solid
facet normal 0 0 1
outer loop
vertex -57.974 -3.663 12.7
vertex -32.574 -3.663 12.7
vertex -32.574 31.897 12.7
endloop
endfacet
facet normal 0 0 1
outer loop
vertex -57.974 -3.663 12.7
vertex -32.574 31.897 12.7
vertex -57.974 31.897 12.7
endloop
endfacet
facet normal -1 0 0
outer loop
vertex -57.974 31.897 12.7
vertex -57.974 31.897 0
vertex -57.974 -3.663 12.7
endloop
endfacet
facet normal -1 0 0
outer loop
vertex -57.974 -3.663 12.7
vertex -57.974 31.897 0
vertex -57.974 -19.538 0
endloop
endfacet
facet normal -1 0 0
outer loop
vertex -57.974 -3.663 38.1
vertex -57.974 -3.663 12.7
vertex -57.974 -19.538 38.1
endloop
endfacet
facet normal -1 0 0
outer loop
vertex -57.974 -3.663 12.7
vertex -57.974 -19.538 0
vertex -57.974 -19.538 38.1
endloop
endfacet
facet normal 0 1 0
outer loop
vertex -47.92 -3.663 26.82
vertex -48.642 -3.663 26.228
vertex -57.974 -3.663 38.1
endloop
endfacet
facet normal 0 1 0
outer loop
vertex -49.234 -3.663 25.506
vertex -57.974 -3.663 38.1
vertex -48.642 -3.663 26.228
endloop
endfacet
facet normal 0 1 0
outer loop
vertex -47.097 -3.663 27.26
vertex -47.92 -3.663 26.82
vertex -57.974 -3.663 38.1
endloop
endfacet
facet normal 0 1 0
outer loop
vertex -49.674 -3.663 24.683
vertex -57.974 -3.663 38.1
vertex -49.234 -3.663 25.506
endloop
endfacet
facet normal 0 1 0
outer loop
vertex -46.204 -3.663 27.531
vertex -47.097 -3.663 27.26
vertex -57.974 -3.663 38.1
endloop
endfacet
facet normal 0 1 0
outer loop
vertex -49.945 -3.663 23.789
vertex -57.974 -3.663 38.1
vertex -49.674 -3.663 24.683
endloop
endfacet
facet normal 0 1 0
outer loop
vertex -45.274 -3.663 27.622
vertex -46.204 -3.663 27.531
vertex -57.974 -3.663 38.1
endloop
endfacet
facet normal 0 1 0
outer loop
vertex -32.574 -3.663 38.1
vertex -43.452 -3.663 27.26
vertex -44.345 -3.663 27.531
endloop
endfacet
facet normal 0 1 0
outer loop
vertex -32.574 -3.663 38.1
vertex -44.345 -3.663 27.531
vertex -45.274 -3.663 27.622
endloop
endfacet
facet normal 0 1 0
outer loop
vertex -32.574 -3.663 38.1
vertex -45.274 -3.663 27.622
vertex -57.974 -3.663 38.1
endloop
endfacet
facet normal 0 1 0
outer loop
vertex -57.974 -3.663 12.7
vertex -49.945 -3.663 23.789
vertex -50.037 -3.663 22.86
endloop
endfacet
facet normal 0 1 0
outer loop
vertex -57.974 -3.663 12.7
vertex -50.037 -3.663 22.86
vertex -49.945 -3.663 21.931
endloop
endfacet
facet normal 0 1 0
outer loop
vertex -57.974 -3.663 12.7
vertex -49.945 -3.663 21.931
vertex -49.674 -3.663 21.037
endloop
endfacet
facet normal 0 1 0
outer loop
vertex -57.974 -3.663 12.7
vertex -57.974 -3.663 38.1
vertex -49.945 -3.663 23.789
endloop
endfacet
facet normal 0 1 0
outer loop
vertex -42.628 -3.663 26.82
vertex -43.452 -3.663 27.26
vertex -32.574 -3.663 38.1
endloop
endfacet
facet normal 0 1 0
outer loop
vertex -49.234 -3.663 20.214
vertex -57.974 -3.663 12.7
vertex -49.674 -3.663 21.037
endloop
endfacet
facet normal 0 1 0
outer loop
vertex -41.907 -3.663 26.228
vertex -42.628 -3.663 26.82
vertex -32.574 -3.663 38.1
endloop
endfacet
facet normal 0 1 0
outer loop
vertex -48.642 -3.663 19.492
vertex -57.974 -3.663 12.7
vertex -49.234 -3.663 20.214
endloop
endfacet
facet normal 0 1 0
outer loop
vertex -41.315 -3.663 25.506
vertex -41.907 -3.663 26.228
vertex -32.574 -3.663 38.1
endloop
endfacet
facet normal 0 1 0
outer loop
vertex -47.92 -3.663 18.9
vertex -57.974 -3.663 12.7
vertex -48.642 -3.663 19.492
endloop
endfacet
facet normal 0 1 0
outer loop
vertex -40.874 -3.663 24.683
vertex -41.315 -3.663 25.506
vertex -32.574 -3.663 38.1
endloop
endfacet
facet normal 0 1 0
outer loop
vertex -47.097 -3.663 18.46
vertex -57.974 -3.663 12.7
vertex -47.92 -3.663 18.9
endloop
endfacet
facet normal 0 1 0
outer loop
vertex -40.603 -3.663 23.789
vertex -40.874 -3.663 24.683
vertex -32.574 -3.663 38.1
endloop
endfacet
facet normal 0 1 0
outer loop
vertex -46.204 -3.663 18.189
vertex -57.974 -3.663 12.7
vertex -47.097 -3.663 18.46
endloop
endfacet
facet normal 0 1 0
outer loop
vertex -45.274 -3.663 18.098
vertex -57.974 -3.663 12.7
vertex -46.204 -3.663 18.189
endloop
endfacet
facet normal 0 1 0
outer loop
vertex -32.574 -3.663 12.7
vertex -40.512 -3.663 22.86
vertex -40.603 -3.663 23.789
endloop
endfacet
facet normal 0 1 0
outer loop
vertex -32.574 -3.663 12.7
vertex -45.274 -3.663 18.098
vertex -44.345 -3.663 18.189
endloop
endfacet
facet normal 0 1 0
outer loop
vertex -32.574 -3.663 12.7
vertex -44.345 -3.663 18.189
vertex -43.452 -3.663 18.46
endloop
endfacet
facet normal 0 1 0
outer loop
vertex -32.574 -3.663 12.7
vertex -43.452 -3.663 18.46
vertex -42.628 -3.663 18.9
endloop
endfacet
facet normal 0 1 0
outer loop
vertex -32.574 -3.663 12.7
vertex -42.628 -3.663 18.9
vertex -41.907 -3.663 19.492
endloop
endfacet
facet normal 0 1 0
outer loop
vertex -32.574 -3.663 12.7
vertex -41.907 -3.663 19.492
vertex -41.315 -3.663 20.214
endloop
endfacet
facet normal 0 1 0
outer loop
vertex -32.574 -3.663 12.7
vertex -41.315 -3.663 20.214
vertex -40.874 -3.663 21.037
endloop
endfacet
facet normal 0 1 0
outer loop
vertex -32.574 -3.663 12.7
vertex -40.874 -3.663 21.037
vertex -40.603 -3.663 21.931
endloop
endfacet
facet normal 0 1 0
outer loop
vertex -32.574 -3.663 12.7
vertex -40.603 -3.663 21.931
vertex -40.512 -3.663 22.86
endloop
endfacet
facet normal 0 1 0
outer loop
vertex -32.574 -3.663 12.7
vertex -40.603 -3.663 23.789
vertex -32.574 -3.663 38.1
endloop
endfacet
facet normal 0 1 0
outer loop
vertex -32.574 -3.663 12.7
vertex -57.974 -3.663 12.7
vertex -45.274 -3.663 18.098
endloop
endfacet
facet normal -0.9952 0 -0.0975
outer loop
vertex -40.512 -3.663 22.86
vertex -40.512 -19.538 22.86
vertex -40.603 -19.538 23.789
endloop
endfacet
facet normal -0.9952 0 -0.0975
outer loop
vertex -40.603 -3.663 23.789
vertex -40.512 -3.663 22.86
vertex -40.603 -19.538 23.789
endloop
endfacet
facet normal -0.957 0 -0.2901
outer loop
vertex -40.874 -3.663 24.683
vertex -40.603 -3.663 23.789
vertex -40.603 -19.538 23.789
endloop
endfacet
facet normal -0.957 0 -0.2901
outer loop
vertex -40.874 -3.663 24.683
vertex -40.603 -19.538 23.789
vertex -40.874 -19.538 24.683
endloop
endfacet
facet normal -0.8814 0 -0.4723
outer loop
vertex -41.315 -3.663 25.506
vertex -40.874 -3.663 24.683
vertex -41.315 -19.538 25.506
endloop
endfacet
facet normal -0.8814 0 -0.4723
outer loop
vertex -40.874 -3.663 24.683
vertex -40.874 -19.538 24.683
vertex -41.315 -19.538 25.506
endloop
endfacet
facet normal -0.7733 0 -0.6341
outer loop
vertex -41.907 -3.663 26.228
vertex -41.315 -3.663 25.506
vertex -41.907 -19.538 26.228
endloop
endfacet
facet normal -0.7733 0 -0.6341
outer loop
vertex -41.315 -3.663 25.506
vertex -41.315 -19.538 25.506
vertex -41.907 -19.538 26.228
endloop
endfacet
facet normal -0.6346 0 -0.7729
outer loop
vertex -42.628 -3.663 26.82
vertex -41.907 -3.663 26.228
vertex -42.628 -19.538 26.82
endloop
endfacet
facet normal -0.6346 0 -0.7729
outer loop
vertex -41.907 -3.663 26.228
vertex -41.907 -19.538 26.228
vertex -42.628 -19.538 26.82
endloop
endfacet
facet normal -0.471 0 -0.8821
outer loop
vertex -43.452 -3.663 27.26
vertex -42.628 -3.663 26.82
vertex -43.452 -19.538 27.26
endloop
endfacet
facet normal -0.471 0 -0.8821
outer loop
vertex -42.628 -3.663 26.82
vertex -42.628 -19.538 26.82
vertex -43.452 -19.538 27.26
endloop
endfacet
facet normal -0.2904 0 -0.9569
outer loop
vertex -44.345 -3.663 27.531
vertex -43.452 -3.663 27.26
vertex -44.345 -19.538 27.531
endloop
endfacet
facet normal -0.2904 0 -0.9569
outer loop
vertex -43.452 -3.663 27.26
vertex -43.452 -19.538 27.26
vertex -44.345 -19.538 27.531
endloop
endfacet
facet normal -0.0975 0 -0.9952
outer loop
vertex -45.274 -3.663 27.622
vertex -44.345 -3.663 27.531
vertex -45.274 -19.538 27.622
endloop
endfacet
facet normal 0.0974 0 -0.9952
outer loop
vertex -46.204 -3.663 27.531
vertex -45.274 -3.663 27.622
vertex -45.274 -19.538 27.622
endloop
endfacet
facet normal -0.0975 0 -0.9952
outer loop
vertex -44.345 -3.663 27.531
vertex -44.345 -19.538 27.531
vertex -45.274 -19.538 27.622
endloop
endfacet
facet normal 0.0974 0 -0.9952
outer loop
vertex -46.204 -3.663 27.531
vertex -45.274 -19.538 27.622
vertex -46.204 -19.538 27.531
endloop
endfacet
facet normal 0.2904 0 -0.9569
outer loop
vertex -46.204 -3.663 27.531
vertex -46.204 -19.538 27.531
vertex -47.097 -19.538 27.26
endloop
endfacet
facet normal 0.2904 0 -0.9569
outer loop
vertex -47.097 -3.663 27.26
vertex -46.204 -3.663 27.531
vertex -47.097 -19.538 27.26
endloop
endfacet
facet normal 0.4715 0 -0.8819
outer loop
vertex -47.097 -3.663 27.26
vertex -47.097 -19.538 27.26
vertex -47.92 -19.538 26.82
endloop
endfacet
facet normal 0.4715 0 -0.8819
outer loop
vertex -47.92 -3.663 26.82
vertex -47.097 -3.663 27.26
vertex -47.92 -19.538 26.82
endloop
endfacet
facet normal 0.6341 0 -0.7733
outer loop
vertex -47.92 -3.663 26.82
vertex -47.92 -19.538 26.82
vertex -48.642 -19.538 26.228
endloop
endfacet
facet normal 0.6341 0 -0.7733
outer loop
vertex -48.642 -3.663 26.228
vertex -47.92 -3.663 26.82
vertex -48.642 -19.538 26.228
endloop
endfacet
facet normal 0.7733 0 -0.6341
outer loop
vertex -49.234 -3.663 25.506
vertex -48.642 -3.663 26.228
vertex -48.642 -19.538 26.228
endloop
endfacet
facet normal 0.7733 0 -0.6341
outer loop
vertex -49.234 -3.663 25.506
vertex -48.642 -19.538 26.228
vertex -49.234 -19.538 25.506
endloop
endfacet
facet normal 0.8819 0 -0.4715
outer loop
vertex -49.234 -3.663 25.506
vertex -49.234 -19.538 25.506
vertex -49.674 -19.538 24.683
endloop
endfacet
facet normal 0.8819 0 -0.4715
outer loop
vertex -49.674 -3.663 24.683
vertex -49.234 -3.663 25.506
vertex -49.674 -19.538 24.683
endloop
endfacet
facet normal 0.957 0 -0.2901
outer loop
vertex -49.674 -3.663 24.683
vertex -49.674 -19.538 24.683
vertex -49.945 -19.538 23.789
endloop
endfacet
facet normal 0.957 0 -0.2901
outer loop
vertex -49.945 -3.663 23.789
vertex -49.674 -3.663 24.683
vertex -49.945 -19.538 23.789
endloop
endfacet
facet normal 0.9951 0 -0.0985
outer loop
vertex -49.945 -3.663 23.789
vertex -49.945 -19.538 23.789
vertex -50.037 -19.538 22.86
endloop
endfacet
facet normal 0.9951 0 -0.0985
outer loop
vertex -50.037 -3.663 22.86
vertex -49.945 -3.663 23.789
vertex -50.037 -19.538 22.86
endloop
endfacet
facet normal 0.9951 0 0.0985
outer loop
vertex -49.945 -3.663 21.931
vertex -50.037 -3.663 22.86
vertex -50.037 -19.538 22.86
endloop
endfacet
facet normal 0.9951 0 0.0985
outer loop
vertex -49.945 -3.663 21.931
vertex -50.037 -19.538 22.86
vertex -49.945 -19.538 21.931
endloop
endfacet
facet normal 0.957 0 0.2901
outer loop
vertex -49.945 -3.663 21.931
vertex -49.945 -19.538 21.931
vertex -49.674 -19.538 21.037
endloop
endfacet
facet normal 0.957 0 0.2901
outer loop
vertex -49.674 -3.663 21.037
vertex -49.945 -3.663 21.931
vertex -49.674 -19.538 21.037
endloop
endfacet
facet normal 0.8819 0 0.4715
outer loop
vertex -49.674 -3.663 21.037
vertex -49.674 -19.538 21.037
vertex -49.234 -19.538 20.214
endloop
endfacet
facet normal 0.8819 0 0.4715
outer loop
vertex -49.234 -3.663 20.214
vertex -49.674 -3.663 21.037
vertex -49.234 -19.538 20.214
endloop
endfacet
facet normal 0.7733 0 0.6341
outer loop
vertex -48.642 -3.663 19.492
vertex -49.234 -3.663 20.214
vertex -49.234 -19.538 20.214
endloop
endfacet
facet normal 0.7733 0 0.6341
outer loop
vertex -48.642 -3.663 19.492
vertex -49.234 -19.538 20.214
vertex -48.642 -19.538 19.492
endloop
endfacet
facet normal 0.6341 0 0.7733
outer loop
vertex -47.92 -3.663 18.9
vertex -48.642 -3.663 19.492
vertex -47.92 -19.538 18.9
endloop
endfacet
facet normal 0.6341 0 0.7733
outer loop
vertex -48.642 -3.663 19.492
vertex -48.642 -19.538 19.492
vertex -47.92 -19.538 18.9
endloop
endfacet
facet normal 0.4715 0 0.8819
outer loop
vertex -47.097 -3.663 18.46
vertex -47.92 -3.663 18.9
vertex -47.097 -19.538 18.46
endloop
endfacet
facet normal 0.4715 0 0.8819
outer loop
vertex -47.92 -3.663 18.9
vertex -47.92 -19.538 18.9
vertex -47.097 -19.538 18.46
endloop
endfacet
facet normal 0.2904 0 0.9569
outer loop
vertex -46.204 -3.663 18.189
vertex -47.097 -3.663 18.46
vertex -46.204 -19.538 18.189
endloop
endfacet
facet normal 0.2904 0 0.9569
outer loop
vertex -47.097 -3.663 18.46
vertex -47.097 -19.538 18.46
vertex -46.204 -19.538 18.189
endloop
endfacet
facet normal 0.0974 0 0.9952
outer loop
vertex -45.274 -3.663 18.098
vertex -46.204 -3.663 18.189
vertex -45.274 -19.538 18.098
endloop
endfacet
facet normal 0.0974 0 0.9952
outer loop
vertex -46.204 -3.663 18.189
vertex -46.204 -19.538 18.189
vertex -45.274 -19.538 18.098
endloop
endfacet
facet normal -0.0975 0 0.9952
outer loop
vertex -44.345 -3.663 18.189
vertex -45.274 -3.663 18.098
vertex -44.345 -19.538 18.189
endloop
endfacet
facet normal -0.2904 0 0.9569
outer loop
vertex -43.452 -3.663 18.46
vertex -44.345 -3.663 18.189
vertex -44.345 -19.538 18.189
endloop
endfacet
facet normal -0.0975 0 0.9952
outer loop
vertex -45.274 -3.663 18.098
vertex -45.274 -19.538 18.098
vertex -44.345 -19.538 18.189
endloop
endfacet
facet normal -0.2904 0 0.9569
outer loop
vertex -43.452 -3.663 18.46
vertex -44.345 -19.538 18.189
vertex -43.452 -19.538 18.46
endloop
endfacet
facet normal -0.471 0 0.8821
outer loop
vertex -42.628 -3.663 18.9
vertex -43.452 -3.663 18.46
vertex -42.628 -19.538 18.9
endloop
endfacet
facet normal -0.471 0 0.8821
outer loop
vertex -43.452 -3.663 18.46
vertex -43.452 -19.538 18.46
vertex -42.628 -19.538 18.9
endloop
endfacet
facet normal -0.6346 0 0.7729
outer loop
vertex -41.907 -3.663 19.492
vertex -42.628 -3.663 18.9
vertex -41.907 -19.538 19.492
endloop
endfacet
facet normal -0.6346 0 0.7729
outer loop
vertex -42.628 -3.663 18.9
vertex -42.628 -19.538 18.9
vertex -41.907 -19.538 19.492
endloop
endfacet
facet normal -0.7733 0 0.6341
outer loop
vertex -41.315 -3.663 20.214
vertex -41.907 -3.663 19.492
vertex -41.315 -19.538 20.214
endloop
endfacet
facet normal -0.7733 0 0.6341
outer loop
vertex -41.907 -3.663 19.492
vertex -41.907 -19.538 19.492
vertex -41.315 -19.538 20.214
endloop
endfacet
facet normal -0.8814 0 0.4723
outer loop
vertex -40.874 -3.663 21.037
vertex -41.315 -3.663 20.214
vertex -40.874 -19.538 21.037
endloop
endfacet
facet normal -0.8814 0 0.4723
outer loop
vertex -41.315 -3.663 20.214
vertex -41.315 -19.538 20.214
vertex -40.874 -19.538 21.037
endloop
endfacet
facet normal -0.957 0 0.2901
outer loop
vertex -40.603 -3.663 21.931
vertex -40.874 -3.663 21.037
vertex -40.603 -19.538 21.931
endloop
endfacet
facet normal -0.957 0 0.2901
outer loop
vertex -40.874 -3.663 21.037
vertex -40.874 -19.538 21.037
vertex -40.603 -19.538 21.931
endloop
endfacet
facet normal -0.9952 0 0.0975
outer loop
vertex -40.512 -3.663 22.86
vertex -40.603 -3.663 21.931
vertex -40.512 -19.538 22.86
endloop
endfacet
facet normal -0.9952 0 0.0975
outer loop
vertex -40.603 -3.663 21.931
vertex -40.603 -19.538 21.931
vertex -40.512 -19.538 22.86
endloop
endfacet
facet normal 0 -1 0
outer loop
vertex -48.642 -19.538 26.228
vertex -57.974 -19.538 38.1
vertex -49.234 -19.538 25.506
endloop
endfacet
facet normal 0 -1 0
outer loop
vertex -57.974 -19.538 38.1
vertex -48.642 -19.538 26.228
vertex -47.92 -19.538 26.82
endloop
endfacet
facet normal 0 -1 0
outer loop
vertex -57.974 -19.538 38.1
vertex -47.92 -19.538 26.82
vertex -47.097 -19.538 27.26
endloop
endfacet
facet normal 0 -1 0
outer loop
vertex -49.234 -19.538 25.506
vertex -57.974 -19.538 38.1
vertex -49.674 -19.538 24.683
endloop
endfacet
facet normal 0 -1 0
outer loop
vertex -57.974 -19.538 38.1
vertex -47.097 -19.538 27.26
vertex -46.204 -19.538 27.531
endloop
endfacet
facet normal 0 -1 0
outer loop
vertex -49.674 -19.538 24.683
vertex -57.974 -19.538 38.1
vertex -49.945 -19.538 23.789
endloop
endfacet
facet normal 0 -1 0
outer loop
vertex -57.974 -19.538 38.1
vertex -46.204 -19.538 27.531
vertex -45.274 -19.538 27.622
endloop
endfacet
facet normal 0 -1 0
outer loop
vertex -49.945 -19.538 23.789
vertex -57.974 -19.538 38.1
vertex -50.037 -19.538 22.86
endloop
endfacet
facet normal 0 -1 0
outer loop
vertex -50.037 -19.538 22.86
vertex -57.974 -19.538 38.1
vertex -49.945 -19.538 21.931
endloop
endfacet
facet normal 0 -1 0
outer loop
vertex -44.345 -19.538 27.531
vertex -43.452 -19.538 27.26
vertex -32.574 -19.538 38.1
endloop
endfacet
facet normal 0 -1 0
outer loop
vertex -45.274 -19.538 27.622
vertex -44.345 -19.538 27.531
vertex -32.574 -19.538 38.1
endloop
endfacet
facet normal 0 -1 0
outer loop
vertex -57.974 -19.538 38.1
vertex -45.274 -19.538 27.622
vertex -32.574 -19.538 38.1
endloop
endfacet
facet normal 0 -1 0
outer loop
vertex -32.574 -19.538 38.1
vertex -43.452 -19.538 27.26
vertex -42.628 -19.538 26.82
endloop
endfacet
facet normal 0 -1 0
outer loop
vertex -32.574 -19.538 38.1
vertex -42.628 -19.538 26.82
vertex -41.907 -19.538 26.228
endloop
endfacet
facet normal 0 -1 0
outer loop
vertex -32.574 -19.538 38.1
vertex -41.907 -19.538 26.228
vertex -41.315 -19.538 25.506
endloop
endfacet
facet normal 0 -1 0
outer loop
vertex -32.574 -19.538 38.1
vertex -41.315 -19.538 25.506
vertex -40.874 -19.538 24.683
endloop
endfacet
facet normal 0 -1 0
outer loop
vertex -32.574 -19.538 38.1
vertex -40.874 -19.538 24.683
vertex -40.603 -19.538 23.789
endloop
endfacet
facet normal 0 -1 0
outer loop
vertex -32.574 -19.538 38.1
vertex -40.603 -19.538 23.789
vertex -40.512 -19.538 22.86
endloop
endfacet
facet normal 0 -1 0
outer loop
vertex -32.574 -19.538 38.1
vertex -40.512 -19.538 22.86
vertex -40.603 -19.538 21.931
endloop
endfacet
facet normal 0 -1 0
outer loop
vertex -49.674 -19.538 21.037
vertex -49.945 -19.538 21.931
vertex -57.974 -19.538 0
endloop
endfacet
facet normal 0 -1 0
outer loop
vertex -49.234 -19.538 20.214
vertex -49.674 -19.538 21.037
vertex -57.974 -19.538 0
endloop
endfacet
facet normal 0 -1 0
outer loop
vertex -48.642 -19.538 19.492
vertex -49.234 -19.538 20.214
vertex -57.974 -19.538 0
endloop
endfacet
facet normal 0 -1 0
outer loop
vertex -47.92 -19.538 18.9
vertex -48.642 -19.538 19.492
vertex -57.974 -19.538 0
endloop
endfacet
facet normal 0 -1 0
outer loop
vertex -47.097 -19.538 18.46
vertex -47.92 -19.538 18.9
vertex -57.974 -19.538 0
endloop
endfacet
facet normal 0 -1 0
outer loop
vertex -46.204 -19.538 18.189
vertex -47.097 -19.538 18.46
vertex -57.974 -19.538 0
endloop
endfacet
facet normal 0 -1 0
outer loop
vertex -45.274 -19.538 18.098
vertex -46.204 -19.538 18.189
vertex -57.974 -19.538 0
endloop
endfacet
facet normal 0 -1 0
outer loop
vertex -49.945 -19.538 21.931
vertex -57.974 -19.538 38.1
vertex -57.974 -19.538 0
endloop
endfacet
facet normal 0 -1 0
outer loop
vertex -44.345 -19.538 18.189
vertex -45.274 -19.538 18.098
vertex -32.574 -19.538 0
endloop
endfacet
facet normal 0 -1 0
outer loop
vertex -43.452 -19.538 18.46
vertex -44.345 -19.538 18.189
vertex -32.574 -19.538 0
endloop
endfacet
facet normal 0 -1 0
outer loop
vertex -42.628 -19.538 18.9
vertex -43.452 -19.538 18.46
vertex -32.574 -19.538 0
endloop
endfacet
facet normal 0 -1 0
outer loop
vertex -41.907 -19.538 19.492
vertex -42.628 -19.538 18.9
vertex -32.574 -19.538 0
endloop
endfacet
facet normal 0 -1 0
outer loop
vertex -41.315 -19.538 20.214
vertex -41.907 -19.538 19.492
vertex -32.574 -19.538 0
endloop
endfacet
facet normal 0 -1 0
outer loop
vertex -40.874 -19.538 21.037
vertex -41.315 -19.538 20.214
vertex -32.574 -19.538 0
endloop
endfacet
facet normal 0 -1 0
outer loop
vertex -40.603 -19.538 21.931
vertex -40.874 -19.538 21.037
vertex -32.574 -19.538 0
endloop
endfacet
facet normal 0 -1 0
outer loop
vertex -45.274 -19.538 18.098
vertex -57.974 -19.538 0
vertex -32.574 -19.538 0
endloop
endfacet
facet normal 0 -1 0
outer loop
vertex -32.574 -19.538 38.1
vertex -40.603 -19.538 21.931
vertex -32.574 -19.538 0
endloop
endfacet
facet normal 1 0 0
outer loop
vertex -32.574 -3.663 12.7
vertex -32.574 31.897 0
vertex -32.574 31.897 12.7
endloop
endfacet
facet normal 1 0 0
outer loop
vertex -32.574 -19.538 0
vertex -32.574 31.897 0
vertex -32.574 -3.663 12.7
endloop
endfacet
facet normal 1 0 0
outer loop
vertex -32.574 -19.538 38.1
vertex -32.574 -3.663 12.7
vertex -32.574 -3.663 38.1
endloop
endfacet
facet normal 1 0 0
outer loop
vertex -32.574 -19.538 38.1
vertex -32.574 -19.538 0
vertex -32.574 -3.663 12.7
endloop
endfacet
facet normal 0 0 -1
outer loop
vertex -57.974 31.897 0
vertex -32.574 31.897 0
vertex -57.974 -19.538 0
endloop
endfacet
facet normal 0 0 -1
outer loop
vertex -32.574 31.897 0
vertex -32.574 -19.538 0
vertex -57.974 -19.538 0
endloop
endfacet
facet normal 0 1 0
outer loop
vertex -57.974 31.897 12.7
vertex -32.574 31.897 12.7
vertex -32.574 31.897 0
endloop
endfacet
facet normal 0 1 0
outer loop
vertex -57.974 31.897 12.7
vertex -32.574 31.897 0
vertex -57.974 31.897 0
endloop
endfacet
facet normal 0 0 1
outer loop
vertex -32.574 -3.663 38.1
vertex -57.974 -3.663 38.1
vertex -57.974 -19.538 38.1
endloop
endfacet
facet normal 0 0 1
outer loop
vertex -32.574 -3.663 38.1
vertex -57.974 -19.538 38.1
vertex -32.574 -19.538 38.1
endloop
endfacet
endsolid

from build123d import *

# Parameters (mm, degrees)
F0_W     = 25.4
F0_H     = 15.875
F1_DEPTH = 38.1
F2_R     = 4.7625
F3_DEPTH = 254000
F4_W     = 25.4
F4_H     = 12.7
F5_DEPTH = 35.56


with BuildPart() as f1:
    # F0 (on Top) → F1 (new body)
    with BuildSketch(Plane.XY):
        with Locations((-45.274386, -11.600519)):
            Rectangle(F0_W, F0_H)
    extrude(amount=F1_DEPTH)

    # F2 (on face) → F3 (cut)
    with BuildSketch(Plane.XZ.offset(19.538019)):
        with Locations((-45.274386, 22.86)):
            Circle(F2_R)
    extrude(amount=-F3_DEPTH, mode=Mode.SUBTRACT)

    # F4 (on face) → F5 (join)
    with BuildSketch(Plane(origin=(0, -3.663019, 0), x_dir=(-1, 0, 0), z_dir=(0, 1, 0))):
        with Locations((45.274386, 6.35)):
            Rectangle(F4_W, F4_H)
    extrude(amount=F5_DEPTH)


solid = f1.part
